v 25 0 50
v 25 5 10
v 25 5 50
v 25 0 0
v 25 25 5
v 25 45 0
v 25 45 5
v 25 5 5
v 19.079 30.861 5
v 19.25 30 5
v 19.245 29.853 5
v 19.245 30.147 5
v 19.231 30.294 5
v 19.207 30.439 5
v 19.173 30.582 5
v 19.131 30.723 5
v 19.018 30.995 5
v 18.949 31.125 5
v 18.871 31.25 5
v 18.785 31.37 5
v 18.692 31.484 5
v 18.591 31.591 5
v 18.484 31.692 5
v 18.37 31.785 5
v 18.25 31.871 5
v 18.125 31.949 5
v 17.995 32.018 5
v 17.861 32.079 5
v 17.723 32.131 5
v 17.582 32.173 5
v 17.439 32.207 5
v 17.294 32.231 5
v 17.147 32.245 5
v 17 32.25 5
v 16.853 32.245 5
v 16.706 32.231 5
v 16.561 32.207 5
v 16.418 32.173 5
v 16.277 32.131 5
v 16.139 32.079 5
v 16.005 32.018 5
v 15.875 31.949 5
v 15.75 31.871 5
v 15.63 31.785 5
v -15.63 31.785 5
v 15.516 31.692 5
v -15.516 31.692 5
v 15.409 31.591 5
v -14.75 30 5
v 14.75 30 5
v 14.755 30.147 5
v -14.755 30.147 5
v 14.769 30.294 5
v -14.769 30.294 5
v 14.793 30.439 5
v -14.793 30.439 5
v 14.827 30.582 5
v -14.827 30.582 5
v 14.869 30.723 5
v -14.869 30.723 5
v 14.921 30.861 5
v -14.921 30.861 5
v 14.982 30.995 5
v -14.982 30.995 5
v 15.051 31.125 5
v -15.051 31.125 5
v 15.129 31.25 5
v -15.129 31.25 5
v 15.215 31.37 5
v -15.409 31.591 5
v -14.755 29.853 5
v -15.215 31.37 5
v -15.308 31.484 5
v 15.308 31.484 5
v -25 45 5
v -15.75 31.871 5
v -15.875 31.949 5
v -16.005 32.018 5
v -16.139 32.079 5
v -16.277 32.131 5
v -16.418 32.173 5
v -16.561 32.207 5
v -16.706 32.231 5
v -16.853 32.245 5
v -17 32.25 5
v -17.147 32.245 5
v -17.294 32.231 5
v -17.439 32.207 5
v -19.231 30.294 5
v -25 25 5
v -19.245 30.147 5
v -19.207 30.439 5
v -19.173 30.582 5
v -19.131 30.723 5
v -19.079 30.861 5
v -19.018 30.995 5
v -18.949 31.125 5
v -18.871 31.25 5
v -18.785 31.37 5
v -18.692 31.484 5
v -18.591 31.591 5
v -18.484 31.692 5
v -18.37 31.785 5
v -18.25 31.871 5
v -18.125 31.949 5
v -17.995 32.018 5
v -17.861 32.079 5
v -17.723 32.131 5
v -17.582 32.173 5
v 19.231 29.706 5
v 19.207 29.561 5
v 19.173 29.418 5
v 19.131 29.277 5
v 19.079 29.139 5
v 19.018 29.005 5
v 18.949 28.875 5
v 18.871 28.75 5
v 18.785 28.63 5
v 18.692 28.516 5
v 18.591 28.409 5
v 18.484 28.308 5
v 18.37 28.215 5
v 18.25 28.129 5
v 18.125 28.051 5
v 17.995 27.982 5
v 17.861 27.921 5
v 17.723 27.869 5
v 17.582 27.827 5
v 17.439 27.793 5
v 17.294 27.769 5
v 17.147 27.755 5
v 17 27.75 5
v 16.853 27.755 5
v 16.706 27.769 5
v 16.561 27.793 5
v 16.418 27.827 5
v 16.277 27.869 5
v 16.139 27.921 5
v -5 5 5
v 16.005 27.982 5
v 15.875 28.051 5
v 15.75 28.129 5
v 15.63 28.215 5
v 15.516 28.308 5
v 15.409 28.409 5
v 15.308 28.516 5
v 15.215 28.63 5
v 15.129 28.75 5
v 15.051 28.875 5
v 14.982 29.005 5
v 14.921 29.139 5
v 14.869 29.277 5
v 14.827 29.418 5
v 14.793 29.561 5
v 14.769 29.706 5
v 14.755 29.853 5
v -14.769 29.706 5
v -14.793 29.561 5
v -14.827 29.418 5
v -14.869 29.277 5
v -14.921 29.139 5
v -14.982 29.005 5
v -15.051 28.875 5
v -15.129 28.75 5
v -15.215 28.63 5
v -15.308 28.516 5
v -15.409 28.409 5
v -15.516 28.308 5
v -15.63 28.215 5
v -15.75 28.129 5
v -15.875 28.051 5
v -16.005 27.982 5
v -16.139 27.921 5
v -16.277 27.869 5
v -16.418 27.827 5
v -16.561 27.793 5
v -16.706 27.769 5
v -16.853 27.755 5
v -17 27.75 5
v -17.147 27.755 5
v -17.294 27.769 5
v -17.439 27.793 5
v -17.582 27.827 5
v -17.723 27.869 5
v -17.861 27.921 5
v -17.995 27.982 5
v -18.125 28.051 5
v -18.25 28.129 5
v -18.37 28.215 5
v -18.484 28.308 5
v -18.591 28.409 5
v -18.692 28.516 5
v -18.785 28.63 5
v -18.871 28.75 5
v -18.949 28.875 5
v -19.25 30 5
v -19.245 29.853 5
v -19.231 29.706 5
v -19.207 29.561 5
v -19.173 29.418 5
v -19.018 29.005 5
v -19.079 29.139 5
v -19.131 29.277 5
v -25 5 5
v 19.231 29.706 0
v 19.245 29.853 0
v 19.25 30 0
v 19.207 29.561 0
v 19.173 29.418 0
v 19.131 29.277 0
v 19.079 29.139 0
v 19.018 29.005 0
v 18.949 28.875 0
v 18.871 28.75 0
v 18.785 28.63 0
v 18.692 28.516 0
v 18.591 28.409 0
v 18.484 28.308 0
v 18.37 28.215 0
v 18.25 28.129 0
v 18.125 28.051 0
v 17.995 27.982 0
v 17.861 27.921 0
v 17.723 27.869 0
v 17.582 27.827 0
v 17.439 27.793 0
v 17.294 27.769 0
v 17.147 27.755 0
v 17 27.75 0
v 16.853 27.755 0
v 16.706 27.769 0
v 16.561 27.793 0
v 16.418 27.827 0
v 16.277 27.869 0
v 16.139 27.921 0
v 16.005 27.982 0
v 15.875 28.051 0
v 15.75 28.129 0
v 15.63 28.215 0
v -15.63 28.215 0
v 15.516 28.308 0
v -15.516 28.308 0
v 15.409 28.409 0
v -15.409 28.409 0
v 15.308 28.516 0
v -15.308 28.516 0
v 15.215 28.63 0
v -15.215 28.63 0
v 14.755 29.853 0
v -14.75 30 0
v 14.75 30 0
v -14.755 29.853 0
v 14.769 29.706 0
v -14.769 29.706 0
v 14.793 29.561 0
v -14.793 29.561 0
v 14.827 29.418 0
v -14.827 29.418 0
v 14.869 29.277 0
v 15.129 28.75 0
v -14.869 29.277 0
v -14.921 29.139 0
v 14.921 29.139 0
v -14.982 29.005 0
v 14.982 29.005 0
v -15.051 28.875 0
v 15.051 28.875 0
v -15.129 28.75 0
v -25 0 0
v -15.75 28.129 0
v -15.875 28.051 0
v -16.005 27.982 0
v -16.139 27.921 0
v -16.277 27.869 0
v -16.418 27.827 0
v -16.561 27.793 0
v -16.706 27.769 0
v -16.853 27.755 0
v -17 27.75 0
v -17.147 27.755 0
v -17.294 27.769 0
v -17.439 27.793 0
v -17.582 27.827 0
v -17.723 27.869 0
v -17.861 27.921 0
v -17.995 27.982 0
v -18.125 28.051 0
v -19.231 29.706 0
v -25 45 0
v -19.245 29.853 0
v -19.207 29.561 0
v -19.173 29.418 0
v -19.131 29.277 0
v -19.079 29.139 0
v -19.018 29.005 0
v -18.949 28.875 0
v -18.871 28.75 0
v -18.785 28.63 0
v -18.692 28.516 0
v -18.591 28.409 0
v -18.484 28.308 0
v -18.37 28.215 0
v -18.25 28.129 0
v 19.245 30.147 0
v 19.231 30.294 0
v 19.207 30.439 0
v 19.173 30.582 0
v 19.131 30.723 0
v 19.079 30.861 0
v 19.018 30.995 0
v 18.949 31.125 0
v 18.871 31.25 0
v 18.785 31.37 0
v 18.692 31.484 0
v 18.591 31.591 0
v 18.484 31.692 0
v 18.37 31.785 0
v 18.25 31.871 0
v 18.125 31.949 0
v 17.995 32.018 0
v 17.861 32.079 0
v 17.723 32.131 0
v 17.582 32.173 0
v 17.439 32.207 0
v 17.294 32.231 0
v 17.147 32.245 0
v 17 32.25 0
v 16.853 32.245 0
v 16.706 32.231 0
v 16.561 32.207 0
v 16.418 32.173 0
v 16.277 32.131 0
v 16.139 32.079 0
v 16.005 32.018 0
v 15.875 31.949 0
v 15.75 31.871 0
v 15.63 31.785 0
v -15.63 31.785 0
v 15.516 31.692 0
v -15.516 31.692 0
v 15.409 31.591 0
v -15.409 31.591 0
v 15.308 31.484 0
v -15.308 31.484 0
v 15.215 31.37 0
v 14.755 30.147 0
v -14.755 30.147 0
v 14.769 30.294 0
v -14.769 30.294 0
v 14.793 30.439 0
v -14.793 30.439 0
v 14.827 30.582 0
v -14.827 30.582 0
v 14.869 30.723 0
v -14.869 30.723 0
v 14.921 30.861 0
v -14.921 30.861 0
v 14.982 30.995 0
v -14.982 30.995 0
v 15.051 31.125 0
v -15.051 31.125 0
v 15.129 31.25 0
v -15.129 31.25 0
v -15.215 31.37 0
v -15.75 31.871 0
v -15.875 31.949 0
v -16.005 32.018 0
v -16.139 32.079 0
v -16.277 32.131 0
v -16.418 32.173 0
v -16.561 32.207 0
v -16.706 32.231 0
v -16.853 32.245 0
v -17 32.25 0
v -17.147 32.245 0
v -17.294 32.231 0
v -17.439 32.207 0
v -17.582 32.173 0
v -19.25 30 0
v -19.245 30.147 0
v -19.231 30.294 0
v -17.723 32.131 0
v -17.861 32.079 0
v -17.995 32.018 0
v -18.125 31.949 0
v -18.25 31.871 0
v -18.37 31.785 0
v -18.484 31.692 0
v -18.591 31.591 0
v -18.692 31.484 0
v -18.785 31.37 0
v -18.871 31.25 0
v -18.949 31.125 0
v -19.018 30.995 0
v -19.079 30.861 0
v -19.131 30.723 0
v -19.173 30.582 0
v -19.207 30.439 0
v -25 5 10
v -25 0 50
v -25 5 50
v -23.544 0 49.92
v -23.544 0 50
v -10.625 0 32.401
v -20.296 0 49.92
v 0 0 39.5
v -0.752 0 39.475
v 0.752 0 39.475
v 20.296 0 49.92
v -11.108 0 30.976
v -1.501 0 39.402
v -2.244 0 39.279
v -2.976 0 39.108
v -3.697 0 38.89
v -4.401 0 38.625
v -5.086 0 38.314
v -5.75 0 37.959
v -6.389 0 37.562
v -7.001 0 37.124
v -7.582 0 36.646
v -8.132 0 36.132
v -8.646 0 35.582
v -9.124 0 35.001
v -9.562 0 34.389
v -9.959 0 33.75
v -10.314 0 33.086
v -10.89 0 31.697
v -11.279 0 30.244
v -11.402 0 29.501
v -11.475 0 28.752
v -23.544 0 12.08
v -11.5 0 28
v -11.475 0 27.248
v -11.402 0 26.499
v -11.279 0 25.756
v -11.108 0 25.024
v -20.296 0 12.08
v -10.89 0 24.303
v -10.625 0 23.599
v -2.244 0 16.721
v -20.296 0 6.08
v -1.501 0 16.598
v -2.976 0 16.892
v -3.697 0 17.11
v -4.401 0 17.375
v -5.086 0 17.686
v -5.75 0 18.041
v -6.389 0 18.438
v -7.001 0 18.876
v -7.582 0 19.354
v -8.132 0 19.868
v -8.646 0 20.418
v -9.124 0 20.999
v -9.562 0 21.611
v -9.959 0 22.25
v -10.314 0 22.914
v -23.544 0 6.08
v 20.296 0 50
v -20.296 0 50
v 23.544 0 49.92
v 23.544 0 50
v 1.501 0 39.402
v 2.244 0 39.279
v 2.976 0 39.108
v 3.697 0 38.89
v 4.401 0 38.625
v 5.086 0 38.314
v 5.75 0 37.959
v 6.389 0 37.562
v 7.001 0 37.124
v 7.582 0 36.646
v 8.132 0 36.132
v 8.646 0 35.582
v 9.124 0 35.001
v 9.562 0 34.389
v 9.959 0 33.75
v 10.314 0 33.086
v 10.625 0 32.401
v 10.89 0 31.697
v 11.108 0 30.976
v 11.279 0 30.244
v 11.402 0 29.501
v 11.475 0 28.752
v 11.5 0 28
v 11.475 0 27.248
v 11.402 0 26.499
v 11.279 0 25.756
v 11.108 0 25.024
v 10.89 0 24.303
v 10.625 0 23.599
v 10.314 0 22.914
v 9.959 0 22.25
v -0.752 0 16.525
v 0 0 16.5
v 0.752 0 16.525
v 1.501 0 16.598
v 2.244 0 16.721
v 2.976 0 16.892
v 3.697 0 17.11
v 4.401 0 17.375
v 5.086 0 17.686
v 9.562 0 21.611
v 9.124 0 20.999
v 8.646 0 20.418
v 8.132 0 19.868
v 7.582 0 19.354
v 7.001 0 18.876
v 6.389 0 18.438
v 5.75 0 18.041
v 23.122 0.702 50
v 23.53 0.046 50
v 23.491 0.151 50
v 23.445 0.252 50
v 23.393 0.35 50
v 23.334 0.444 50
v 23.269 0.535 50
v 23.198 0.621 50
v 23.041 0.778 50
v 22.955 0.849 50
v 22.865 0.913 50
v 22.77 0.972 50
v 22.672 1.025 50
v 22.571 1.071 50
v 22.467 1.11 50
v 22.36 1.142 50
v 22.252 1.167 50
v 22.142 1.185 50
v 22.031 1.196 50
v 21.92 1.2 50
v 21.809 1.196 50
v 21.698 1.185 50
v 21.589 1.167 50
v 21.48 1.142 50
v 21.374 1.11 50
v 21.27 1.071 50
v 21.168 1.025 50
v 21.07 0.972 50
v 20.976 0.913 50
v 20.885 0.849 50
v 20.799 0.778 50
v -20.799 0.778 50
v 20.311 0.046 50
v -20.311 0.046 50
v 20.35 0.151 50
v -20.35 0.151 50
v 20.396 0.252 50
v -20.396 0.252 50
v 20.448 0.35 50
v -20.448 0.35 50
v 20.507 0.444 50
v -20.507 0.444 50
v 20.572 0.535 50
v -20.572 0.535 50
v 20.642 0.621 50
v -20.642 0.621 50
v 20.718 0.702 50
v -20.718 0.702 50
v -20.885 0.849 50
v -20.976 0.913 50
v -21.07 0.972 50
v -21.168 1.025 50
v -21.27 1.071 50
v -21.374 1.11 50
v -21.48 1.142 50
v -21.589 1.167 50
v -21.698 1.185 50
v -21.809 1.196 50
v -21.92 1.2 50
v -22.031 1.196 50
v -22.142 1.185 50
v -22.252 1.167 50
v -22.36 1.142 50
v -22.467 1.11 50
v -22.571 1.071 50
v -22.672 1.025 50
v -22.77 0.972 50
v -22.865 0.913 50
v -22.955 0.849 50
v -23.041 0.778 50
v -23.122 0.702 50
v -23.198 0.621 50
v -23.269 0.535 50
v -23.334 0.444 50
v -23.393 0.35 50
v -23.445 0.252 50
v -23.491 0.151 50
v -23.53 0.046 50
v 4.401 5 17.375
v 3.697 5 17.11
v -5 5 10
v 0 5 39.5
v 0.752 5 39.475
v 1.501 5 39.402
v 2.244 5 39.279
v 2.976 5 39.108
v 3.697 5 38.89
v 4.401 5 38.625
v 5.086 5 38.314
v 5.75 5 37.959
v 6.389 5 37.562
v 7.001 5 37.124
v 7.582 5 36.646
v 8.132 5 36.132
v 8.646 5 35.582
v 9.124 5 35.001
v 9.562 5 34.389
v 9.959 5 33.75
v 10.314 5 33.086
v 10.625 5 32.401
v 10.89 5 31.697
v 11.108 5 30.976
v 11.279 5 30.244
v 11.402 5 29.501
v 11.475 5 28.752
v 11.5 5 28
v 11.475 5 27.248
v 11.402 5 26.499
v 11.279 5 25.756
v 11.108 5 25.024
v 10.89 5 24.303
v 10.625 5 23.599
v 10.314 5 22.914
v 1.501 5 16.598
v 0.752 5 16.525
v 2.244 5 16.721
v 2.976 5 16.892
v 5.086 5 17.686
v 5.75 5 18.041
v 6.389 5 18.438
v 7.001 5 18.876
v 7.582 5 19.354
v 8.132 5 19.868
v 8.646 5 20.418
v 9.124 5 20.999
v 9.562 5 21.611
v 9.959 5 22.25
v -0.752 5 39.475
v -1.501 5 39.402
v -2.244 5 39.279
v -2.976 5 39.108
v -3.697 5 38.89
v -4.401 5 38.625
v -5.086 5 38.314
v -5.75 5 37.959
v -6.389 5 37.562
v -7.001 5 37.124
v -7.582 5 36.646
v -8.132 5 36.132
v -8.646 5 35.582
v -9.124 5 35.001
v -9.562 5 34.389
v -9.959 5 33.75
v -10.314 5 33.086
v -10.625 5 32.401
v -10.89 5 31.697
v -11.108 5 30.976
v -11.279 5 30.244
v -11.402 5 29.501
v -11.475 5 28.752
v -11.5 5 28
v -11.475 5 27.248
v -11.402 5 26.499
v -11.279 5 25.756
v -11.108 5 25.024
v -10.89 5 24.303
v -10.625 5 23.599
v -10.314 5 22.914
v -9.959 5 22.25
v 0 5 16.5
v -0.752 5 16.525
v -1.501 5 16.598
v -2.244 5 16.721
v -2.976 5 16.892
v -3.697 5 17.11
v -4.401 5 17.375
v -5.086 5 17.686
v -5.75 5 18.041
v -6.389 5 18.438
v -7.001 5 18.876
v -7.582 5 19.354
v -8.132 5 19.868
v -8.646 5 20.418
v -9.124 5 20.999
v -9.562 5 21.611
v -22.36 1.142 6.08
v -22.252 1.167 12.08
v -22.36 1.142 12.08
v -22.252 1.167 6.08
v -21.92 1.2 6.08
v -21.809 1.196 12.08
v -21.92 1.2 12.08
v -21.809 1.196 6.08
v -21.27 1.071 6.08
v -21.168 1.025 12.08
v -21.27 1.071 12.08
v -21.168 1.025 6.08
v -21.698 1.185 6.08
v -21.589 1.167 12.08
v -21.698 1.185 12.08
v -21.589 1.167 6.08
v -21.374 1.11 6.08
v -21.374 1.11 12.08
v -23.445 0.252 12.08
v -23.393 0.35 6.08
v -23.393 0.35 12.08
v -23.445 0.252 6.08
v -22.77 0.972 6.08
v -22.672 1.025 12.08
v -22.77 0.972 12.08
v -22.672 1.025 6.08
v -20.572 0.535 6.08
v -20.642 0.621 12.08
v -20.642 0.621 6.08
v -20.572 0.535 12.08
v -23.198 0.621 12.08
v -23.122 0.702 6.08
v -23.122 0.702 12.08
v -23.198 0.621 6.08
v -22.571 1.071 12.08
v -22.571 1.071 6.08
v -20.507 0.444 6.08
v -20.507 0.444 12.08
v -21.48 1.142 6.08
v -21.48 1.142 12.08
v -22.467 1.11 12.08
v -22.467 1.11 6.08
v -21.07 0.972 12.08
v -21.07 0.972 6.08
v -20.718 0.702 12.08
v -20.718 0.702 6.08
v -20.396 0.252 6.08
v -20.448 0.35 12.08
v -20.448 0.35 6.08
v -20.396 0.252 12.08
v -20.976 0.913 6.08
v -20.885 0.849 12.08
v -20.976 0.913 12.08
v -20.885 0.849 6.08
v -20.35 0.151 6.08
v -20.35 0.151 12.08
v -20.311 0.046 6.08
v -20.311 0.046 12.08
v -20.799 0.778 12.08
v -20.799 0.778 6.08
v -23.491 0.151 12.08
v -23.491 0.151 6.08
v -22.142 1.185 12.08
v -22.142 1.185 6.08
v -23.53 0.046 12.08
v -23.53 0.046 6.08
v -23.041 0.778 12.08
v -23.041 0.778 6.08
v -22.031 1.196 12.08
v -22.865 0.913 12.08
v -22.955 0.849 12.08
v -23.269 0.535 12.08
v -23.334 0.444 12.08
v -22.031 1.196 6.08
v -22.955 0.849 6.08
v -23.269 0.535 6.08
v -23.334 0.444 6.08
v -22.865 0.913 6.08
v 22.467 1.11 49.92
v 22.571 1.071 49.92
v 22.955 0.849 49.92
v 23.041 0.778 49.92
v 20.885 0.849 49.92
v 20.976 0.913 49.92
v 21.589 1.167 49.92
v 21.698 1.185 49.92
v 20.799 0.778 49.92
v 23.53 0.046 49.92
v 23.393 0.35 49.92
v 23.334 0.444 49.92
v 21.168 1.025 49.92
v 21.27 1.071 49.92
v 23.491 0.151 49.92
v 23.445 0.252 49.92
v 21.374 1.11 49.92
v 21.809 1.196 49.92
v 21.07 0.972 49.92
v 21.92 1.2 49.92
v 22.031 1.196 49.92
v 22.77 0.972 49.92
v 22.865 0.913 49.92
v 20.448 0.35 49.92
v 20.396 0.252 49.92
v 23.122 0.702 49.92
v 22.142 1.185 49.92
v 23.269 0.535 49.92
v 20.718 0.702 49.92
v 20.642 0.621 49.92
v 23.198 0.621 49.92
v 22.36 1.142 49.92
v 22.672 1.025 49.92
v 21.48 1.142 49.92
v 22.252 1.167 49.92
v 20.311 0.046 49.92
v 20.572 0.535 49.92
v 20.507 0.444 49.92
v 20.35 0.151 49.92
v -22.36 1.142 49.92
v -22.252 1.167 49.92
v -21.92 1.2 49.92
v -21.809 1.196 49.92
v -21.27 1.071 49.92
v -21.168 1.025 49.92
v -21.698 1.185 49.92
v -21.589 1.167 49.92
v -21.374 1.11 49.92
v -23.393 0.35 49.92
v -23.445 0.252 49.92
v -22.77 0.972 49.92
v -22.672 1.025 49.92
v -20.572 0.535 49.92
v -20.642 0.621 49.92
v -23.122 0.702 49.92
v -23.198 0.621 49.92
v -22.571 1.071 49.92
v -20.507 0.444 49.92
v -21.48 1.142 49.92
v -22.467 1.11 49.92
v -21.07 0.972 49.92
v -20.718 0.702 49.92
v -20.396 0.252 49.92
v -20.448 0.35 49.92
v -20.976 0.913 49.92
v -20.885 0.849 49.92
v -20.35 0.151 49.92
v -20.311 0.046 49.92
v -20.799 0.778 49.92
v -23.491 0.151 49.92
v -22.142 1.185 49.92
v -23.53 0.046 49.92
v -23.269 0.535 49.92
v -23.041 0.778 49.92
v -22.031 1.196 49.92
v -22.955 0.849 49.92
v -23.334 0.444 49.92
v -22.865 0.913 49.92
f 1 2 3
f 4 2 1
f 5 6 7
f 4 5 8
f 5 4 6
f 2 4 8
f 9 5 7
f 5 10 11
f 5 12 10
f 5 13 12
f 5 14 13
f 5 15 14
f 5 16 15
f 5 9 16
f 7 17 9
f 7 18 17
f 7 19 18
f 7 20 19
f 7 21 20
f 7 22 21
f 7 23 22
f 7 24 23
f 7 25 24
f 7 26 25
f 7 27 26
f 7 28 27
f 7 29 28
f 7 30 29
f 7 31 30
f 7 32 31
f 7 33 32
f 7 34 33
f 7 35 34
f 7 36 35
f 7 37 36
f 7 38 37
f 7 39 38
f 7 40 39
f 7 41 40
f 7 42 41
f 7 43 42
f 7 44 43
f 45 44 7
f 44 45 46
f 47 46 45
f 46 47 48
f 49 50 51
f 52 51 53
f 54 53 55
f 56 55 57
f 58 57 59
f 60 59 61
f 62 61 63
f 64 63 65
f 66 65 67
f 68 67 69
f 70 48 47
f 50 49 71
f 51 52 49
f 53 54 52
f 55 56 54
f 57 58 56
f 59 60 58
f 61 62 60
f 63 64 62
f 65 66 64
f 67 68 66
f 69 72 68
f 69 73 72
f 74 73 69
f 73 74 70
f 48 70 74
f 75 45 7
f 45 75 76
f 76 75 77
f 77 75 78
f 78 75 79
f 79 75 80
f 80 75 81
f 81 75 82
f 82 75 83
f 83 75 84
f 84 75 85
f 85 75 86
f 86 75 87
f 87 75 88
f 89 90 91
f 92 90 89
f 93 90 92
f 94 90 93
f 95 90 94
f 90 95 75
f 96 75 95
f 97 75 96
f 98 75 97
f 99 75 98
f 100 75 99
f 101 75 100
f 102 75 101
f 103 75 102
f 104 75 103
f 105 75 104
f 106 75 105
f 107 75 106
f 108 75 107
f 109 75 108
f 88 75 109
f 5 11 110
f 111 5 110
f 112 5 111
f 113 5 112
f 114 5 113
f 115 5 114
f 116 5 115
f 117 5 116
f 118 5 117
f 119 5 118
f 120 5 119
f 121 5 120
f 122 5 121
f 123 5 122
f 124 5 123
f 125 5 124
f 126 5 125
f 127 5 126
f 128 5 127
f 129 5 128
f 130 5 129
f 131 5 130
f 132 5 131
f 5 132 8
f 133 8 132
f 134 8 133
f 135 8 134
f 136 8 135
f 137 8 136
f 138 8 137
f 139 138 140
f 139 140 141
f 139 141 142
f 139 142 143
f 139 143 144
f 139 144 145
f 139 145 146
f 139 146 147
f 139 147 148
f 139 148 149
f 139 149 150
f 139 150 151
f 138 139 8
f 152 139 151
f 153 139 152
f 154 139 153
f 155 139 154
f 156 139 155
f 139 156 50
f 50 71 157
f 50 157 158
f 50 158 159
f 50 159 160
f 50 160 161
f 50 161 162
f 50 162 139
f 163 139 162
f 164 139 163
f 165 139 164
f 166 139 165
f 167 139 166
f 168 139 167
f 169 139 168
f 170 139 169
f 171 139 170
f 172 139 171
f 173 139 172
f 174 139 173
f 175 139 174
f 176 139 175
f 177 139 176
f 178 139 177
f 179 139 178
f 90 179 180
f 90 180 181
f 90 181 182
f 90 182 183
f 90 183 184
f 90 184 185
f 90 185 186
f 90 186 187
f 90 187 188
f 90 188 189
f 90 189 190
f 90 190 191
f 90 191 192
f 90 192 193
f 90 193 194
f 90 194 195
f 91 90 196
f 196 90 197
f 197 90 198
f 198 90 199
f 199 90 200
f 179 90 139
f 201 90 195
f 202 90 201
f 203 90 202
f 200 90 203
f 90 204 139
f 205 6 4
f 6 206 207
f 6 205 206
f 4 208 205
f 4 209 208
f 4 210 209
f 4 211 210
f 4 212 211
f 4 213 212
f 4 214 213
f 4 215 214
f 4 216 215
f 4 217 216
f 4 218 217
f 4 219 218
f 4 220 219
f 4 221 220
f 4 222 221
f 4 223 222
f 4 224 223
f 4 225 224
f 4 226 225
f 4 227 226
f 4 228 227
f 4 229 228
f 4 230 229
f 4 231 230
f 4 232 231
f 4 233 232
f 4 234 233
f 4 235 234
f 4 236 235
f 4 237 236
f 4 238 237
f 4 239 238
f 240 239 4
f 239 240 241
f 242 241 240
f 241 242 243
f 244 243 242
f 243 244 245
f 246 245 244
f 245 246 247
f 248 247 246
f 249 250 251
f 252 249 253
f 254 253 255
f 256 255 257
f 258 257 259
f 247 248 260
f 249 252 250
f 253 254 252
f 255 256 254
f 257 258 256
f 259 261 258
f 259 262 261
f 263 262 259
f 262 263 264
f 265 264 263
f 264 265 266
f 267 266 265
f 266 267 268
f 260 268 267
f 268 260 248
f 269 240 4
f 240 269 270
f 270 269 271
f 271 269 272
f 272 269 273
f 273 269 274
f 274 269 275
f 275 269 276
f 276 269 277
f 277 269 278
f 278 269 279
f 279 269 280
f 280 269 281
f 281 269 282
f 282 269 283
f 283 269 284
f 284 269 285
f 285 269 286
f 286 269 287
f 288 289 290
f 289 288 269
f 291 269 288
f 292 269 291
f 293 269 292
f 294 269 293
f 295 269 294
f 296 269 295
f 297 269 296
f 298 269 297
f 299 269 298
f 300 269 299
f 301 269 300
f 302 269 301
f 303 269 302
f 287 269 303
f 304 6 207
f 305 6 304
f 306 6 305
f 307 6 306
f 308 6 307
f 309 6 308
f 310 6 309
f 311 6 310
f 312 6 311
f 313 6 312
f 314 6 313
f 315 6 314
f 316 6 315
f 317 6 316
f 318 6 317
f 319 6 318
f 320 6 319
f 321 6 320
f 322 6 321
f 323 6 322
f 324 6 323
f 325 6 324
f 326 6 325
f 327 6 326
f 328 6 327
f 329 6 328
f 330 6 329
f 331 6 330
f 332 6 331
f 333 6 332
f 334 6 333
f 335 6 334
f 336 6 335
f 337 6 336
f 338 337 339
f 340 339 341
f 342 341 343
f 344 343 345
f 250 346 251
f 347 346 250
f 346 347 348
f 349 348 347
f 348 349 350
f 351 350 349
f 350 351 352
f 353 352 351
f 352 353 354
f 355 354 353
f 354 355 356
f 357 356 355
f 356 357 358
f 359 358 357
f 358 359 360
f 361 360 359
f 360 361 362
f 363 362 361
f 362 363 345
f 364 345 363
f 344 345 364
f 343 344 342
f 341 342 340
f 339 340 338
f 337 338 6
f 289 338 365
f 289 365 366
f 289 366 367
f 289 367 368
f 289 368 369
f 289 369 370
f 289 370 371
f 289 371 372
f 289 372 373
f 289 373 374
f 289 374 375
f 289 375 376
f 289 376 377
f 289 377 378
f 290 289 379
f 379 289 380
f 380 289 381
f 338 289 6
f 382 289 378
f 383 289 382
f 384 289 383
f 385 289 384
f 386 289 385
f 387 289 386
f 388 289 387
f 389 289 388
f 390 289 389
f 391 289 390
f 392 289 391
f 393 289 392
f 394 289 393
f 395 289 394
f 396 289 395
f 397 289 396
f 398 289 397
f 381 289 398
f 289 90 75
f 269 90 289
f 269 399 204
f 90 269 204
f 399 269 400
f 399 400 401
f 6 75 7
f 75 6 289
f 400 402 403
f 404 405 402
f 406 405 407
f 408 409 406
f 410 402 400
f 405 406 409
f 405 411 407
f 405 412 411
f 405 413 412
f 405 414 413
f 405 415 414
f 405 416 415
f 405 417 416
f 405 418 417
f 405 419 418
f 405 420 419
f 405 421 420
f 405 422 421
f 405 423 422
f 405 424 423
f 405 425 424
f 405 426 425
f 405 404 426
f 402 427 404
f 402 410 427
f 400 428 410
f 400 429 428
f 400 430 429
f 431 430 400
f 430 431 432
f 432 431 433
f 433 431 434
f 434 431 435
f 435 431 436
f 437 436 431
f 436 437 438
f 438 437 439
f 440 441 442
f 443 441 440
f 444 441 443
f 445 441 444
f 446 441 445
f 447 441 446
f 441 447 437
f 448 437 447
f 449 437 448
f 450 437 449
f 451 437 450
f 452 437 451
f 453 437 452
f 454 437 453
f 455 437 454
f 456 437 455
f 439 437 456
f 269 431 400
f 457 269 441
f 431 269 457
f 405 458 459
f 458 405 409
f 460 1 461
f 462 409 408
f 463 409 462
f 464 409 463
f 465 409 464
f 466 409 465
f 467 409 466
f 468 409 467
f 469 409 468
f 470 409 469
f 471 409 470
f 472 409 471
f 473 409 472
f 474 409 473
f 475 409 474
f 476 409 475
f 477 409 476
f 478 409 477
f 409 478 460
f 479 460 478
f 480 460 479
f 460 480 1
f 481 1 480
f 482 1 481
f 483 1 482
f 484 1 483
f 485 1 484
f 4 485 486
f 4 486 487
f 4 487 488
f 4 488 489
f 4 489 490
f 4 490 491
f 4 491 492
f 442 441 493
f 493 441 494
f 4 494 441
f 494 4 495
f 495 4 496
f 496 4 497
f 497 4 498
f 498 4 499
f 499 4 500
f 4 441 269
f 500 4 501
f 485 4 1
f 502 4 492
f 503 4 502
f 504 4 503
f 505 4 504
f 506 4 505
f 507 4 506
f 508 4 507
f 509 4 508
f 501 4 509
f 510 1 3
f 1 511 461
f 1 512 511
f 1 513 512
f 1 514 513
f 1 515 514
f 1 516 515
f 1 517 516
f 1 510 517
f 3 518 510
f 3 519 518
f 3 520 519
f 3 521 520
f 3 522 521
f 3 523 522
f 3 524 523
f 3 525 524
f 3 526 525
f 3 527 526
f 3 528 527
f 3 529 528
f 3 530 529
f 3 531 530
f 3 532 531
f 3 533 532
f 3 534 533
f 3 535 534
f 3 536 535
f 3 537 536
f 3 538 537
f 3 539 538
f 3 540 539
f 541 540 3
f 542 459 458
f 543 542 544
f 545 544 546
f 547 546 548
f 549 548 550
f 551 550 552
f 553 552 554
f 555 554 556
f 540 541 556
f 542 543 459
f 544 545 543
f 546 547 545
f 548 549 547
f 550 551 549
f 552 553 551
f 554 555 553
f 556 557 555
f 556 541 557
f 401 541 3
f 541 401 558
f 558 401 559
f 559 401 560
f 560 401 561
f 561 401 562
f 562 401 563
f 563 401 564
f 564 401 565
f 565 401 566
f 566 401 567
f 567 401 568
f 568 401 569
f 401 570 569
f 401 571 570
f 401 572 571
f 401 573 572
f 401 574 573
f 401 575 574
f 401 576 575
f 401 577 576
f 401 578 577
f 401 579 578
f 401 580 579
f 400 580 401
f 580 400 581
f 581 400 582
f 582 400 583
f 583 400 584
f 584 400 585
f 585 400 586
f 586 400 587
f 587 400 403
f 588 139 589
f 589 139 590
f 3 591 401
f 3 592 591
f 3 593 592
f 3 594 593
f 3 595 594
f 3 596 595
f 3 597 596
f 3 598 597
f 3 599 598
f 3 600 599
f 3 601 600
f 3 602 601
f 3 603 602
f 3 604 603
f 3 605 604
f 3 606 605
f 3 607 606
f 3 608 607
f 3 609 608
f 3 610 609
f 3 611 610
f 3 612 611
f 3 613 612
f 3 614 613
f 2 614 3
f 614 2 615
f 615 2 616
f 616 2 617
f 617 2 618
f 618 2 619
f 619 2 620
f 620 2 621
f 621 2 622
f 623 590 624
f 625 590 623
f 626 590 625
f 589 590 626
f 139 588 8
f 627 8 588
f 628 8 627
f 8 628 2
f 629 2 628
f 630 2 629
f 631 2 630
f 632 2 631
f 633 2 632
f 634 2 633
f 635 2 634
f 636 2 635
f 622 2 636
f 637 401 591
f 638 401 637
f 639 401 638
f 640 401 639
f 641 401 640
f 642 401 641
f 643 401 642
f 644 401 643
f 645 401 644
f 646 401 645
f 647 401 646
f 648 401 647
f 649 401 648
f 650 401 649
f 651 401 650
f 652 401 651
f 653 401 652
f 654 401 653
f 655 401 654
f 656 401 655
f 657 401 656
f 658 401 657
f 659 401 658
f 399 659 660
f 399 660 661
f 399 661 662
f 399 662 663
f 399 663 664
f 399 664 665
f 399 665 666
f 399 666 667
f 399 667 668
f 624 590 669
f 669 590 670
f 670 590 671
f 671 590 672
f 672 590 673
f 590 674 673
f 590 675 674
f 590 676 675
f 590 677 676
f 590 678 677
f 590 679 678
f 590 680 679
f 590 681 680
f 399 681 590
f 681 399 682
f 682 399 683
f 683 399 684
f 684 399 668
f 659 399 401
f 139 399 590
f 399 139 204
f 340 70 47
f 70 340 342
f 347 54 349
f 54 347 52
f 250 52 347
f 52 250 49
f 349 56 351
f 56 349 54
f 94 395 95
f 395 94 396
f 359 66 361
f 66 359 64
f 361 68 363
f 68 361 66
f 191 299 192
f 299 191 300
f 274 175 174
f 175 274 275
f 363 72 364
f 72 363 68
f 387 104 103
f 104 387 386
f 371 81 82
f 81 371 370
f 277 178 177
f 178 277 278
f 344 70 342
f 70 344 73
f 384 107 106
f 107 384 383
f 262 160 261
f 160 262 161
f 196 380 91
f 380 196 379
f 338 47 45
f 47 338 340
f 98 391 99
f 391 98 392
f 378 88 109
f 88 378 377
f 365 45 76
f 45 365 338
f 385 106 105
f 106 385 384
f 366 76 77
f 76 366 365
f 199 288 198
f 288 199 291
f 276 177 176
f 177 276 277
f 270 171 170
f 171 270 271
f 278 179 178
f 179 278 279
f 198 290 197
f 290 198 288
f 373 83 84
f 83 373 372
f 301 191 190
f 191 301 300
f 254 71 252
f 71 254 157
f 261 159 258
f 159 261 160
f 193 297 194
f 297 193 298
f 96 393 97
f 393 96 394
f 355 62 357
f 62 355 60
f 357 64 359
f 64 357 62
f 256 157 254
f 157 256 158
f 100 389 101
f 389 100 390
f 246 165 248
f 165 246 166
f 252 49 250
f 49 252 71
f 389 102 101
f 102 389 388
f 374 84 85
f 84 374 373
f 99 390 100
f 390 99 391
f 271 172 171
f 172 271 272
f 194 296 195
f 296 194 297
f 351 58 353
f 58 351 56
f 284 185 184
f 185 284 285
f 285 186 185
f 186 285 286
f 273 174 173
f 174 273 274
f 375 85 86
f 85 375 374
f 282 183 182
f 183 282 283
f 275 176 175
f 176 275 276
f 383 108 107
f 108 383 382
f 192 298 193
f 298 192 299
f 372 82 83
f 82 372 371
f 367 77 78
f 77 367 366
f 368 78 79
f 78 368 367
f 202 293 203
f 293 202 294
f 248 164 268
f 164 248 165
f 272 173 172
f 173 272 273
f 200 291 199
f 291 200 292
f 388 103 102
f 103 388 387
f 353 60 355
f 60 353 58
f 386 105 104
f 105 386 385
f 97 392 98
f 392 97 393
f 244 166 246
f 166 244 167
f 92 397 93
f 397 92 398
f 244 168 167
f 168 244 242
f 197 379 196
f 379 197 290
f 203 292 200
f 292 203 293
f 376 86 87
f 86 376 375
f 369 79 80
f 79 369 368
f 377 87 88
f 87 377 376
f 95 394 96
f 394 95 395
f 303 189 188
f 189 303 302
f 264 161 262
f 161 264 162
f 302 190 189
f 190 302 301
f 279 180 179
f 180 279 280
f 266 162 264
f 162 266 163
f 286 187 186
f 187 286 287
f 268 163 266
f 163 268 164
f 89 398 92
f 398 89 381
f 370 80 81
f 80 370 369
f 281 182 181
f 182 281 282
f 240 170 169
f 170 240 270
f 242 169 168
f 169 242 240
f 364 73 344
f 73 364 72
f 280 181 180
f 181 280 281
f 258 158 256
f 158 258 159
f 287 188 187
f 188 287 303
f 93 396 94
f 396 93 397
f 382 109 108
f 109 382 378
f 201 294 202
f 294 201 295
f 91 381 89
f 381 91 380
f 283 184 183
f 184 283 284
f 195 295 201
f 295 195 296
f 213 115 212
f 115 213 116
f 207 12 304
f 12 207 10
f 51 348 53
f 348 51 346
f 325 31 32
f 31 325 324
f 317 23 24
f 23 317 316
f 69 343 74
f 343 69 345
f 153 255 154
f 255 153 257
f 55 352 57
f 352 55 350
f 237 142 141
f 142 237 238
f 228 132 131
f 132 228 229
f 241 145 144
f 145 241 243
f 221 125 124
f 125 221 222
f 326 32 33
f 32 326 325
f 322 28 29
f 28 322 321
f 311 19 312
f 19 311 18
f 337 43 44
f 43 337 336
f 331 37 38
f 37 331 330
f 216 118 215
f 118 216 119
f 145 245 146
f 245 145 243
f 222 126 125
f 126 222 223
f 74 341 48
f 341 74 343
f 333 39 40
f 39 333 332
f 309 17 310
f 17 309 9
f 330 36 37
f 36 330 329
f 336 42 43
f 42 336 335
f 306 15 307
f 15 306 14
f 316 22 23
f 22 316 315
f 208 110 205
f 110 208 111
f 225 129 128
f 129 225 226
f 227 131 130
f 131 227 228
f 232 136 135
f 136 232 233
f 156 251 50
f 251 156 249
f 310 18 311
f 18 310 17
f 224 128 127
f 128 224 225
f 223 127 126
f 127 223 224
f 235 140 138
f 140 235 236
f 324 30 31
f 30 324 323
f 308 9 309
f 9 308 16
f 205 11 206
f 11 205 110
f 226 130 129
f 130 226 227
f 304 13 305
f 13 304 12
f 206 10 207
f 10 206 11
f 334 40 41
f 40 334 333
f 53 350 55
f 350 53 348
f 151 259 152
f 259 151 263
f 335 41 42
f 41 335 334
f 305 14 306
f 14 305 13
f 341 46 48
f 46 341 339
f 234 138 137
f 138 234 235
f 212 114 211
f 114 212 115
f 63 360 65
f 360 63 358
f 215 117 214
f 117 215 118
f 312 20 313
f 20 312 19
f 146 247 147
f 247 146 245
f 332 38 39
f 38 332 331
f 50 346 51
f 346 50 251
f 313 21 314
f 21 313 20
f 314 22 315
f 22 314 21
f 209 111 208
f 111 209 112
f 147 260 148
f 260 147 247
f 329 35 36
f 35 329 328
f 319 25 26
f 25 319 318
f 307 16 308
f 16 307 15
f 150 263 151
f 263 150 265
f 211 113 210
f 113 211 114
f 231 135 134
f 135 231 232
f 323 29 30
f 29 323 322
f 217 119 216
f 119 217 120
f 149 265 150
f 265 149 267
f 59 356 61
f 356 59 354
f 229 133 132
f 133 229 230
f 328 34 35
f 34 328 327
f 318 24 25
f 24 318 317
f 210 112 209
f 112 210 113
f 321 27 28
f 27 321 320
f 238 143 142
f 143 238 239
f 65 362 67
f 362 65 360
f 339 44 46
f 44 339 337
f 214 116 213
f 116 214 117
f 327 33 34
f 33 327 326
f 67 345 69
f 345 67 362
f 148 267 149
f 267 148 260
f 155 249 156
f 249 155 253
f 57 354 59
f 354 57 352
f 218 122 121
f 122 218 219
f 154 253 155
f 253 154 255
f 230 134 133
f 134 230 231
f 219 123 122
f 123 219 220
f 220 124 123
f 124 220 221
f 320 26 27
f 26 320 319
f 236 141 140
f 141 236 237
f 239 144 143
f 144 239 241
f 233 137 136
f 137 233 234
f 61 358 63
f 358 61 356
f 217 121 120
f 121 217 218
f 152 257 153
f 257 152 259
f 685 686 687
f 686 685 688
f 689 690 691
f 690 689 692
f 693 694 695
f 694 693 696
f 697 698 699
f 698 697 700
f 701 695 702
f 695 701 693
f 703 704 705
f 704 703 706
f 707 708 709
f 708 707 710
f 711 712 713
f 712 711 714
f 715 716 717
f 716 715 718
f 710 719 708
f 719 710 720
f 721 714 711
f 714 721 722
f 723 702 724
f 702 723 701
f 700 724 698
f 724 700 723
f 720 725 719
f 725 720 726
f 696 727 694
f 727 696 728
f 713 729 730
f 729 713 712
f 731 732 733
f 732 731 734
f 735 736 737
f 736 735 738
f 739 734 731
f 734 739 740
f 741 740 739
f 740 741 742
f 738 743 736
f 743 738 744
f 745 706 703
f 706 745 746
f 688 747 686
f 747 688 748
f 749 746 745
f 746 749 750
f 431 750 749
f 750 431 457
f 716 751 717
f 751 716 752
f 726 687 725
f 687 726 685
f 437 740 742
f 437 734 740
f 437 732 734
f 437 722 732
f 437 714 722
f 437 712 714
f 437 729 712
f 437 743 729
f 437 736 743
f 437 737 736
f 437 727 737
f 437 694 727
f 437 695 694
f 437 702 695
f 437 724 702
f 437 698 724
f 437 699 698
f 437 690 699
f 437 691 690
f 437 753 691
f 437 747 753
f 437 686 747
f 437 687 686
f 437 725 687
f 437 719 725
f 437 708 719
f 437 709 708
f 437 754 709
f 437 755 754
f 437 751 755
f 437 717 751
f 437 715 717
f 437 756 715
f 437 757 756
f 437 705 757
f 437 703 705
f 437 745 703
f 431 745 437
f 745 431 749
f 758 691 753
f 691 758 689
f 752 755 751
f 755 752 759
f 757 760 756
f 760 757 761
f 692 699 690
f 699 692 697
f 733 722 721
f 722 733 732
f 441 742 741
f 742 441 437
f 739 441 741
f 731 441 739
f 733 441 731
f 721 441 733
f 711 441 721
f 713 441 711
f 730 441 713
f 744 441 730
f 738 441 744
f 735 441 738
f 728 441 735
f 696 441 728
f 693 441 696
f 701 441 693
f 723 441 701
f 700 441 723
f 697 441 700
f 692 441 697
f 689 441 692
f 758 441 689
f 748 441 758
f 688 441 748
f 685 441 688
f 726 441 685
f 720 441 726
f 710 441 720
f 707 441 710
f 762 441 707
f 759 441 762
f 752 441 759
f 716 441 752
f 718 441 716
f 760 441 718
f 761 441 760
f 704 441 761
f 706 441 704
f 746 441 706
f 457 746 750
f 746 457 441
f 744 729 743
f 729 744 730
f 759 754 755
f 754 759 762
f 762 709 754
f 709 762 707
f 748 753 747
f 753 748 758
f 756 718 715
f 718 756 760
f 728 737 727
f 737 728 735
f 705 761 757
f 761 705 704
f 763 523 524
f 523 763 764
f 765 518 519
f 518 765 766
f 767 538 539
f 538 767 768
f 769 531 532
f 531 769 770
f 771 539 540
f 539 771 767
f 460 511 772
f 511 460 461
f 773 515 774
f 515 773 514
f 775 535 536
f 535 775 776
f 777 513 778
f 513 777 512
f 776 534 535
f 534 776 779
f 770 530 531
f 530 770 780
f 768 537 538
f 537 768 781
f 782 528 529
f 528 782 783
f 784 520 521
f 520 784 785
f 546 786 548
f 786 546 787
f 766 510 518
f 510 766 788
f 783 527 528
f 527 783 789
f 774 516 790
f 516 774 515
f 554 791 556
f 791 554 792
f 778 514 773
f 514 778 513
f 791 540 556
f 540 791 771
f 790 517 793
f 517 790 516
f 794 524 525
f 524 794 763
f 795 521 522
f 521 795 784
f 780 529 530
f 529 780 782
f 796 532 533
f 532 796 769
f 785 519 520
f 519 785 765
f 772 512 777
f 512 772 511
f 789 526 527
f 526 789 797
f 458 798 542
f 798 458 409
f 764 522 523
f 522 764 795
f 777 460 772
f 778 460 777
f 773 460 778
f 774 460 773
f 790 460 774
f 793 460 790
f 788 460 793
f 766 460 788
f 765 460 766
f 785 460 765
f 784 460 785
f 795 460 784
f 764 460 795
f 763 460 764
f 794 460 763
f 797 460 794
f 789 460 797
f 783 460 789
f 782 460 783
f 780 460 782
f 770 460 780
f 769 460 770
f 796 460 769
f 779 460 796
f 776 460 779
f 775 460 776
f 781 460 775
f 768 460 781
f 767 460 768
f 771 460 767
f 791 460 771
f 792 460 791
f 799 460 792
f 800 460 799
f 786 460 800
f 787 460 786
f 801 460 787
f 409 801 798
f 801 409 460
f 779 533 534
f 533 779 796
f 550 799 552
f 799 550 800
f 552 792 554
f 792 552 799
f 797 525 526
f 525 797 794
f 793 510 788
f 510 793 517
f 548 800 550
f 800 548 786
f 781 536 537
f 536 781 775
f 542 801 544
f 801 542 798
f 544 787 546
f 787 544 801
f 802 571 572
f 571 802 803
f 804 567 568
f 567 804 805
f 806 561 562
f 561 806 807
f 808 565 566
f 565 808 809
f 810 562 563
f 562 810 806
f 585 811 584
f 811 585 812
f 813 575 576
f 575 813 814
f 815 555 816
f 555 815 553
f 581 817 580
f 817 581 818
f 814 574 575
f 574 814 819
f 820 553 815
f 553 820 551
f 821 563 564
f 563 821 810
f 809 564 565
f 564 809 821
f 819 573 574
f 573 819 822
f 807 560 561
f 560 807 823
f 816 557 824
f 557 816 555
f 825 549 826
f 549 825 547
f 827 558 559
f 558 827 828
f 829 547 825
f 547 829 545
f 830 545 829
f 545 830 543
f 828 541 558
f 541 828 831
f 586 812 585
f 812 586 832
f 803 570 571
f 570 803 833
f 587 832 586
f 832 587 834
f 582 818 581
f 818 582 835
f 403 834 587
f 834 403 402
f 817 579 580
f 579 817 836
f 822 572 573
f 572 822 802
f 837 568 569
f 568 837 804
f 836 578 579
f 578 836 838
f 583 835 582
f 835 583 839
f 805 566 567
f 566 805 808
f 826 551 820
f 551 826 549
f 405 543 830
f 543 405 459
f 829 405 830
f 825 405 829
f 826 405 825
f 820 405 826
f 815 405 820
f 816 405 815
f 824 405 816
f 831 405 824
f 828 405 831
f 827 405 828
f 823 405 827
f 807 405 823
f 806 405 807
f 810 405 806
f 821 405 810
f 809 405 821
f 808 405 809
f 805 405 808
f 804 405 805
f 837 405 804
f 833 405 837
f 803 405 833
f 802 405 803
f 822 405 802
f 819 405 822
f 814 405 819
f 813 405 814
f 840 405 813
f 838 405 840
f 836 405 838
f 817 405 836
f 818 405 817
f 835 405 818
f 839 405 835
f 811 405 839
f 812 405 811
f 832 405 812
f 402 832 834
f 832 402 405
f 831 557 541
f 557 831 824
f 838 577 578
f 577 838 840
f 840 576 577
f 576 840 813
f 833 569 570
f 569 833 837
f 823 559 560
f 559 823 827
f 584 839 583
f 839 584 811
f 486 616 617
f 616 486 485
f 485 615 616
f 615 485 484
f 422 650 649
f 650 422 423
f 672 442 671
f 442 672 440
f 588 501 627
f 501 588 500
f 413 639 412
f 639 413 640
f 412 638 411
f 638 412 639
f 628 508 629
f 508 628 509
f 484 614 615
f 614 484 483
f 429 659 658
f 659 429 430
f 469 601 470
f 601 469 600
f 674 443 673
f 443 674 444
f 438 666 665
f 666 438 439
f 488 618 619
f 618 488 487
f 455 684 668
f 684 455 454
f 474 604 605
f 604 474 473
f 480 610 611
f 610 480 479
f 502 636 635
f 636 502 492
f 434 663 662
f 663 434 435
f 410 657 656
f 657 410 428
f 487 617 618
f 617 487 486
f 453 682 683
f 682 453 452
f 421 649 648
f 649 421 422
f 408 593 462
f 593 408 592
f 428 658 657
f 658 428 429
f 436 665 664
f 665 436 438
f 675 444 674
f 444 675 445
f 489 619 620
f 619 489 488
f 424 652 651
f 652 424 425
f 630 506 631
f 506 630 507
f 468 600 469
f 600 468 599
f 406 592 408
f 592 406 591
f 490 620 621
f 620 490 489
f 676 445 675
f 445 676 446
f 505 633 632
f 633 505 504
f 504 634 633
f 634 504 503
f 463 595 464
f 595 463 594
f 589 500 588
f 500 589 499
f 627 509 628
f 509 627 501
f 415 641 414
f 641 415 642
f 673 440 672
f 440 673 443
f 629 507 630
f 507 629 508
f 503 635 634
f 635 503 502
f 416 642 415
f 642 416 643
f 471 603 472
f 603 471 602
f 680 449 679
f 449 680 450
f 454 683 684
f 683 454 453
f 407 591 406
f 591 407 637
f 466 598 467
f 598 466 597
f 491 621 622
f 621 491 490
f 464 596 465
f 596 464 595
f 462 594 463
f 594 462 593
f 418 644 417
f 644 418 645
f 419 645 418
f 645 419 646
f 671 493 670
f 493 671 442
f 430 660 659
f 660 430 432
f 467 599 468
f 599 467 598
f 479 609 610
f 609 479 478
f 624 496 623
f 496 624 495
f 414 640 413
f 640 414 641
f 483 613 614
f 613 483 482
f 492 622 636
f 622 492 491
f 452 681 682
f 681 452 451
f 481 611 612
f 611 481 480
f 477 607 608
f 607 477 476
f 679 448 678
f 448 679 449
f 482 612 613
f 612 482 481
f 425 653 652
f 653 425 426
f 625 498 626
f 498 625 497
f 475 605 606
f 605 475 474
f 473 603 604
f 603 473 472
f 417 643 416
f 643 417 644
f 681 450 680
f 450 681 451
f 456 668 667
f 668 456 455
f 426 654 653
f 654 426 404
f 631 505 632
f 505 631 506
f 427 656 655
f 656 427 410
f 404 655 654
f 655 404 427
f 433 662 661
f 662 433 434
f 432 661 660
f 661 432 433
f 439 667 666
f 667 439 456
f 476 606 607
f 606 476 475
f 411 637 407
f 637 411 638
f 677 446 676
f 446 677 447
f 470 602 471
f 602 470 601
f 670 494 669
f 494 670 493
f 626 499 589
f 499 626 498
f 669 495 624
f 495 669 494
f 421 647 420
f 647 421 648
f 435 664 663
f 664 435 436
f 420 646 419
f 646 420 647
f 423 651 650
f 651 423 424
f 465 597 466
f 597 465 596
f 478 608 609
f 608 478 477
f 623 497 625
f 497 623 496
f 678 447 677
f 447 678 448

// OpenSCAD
// NEMA 17 stepper motor L-shaped mounting bracket
// Print orientation: base plate on the bed, vertical plate standing on its back edge

// ---------- Parameters ----------
base_x1      = -25;   // base plate left edge (X)
base_x2      = 25;    // base plate right edge (X)
base_y       = 45;    // base plate length (Y)
base_z       = 5;     // base plate thickness (Z)

motor_x1     = -25;   // motor plate left edge (X)
motor_x2     = 25;    // motor plate right edge (X)
motor_y      = 5;     // motor plate thickness (Y)
motor_z      = 50;    // motor plate height (Z)

boss_d       = 23;    // motor centring boss hole diameter
boss_x       = 0;     // boss hole centre X
boss_z       = 28;    // boss hole centre Z

screw_d      = 3.4;   // M3 screw hole diameter
screw_pitch  = 31;    // screw hole square pattern size
screw_n      = 4;     // number of screw holes

gusset_t     = 5;     // gusset thickness (X)
gusset_y     = 20;    // gusset leg along +Y
gusset_z     = 20;    // gusset leg along +Z

hole_d       = 4.5;   // M4 through-hole diameter (base plate)
eps          = 0.5;   // cutter overshoot past faces

$fn = 96;

// ---------- Model ----------
difference() {
    union() {
        // Base plate
        translate([base_x1, 0, 0])
            cube([base_x2 - base_x1, base_y, base_z]);

        // Vertical motor plate
        translate([motor_x1, 0, 0])
            cube([motor_x2 - motor_x1, motor_y, motor_z]);
    }

    // Through-holes in base plate
    for (sx = [-17, 17])
        translate([sx, 30, -eps])
            cylinder(d = hole_d, h = base_z + 2 * eps);

    // Motor centring boss hole (along Y)
    translate([boss_x, -eps, boss_z])
        rotate([-90, 0, 0])
            cylinder(d = boss_d, h = motor_y + 2 * eps);

    // M3 screw holes on square pattern, centred on boss hole
    for (i = [0 : screw_n - 1]) {
        a = screw_pitch / sqrt(2);
        x = (i % 2 == 0) ? -a : a;
        z = (i / 2 == 0) ? boss_z - a : boss_z + a;
        translate([x, -eps, z])
            cylinder(d = screw_d, h = motor_y + 2 * eps);
    }

    // Triangular gussets, flush with left and right edges
    for (dx = [-25, 25])
        translate([dx, 5, 5])
            linear_extrude(height = gusset_t)
                polygon([[0, 0], [gusset_y, 0], [0, gusset_z]]);
}
